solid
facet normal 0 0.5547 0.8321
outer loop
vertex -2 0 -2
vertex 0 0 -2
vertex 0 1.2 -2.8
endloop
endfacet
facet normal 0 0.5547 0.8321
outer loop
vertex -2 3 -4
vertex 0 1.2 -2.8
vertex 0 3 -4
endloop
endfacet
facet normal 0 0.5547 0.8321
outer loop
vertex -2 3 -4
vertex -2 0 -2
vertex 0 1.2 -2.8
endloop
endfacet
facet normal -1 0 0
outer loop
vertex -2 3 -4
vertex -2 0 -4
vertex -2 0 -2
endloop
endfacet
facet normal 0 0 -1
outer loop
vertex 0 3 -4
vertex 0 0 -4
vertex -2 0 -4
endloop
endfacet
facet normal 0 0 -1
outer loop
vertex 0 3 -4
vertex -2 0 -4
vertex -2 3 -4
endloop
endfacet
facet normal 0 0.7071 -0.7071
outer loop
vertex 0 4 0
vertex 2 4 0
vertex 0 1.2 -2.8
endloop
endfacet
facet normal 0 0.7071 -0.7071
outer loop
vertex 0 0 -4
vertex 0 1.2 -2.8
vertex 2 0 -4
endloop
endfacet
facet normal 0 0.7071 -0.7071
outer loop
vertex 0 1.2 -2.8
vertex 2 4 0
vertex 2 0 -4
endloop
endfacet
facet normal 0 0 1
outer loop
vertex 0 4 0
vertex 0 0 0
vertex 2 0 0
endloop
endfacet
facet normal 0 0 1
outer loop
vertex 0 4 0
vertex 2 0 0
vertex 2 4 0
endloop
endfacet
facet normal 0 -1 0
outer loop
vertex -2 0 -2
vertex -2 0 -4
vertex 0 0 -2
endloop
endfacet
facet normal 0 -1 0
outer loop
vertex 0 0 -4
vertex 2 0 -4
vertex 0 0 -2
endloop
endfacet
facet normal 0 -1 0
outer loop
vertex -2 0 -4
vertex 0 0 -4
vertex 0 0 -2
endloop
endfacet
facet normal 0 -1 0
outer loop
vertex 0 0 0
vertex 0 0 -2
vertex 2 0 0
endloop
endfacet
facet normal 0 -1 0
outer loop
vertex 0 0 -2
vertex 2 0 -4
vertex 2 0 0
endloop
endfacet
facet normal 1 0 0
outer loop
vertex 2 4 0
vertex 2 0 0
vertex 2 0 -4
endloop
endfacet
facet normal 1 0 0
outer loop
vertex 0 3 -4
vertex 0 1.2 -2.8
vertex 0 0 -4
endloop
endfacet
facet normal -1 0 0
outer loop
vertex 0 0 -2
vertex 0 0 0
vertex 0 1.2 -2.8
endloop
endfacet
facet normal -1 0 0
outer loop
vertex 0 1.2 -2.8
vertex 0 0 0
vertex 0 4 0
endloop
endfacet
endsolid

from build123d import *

# Parameters (mm, degrees)
SKETCH1_W           = 4
SKETCH1_H           = 4
BOSS_EXTRUDE1_DEPTH = 2
SKETCH2_W           = 2
SKETCH2_H           = 3
BOSS_EXTRUDE2_DEPTH = 2
CUT_EXTRUDE2_DEPTH  = 2
CUT_EXTRUDE3_DEPTH  = 2


with BuildPart() as part:
    # Sketch1 → Boss-Extrude1 (new body)
    with BuildSketch(Plane(origin=(0, 0, 0), x_dir=(0, 0, -1), z_dir=(1, 0, 0))):
        with Locations((2, 2)):
            Rectangle(SKETCH1_W, SKETCH1_H)
    extrude(amount=BOSS_EXTRUDE1_DEPTH)

    # Sketch2 → Boss-Extrude2 (add)
    with BuildSketch(Plane.ZY):
        with Locations((-3, 1.5)):
            Rectangle(SKETCH2_W, SKETCH2_H)
    extrude(amount=BOSS_EXTRUDE2_DEPTH)

    # Sketch3 → Cut-Extrude2 (cut)
    with BuildSketch(Plane(origin=(2, 0, 0), x_dir=(0, 0, -1), z_dir=(1, 0, 0))):
        Polygon((0, 4), (4, 0), (4, 4), align=None)
    extrude(amount=-CUT_EXTRUDE2_DEPTH, mode=Mode.SUBTRACT)

    # Sketch4 → Cut-Extrude3 (cut)
    with BuildSketch(Plane.ZY.offset(2)):
        Polygon((-2, 0), (-4, 3), (-2, 3), align=None)
    extrude(amount=-CUT_EXTRUDE3_DEPTH, mode=Mode.SUBTRACT)


solid = part.part
